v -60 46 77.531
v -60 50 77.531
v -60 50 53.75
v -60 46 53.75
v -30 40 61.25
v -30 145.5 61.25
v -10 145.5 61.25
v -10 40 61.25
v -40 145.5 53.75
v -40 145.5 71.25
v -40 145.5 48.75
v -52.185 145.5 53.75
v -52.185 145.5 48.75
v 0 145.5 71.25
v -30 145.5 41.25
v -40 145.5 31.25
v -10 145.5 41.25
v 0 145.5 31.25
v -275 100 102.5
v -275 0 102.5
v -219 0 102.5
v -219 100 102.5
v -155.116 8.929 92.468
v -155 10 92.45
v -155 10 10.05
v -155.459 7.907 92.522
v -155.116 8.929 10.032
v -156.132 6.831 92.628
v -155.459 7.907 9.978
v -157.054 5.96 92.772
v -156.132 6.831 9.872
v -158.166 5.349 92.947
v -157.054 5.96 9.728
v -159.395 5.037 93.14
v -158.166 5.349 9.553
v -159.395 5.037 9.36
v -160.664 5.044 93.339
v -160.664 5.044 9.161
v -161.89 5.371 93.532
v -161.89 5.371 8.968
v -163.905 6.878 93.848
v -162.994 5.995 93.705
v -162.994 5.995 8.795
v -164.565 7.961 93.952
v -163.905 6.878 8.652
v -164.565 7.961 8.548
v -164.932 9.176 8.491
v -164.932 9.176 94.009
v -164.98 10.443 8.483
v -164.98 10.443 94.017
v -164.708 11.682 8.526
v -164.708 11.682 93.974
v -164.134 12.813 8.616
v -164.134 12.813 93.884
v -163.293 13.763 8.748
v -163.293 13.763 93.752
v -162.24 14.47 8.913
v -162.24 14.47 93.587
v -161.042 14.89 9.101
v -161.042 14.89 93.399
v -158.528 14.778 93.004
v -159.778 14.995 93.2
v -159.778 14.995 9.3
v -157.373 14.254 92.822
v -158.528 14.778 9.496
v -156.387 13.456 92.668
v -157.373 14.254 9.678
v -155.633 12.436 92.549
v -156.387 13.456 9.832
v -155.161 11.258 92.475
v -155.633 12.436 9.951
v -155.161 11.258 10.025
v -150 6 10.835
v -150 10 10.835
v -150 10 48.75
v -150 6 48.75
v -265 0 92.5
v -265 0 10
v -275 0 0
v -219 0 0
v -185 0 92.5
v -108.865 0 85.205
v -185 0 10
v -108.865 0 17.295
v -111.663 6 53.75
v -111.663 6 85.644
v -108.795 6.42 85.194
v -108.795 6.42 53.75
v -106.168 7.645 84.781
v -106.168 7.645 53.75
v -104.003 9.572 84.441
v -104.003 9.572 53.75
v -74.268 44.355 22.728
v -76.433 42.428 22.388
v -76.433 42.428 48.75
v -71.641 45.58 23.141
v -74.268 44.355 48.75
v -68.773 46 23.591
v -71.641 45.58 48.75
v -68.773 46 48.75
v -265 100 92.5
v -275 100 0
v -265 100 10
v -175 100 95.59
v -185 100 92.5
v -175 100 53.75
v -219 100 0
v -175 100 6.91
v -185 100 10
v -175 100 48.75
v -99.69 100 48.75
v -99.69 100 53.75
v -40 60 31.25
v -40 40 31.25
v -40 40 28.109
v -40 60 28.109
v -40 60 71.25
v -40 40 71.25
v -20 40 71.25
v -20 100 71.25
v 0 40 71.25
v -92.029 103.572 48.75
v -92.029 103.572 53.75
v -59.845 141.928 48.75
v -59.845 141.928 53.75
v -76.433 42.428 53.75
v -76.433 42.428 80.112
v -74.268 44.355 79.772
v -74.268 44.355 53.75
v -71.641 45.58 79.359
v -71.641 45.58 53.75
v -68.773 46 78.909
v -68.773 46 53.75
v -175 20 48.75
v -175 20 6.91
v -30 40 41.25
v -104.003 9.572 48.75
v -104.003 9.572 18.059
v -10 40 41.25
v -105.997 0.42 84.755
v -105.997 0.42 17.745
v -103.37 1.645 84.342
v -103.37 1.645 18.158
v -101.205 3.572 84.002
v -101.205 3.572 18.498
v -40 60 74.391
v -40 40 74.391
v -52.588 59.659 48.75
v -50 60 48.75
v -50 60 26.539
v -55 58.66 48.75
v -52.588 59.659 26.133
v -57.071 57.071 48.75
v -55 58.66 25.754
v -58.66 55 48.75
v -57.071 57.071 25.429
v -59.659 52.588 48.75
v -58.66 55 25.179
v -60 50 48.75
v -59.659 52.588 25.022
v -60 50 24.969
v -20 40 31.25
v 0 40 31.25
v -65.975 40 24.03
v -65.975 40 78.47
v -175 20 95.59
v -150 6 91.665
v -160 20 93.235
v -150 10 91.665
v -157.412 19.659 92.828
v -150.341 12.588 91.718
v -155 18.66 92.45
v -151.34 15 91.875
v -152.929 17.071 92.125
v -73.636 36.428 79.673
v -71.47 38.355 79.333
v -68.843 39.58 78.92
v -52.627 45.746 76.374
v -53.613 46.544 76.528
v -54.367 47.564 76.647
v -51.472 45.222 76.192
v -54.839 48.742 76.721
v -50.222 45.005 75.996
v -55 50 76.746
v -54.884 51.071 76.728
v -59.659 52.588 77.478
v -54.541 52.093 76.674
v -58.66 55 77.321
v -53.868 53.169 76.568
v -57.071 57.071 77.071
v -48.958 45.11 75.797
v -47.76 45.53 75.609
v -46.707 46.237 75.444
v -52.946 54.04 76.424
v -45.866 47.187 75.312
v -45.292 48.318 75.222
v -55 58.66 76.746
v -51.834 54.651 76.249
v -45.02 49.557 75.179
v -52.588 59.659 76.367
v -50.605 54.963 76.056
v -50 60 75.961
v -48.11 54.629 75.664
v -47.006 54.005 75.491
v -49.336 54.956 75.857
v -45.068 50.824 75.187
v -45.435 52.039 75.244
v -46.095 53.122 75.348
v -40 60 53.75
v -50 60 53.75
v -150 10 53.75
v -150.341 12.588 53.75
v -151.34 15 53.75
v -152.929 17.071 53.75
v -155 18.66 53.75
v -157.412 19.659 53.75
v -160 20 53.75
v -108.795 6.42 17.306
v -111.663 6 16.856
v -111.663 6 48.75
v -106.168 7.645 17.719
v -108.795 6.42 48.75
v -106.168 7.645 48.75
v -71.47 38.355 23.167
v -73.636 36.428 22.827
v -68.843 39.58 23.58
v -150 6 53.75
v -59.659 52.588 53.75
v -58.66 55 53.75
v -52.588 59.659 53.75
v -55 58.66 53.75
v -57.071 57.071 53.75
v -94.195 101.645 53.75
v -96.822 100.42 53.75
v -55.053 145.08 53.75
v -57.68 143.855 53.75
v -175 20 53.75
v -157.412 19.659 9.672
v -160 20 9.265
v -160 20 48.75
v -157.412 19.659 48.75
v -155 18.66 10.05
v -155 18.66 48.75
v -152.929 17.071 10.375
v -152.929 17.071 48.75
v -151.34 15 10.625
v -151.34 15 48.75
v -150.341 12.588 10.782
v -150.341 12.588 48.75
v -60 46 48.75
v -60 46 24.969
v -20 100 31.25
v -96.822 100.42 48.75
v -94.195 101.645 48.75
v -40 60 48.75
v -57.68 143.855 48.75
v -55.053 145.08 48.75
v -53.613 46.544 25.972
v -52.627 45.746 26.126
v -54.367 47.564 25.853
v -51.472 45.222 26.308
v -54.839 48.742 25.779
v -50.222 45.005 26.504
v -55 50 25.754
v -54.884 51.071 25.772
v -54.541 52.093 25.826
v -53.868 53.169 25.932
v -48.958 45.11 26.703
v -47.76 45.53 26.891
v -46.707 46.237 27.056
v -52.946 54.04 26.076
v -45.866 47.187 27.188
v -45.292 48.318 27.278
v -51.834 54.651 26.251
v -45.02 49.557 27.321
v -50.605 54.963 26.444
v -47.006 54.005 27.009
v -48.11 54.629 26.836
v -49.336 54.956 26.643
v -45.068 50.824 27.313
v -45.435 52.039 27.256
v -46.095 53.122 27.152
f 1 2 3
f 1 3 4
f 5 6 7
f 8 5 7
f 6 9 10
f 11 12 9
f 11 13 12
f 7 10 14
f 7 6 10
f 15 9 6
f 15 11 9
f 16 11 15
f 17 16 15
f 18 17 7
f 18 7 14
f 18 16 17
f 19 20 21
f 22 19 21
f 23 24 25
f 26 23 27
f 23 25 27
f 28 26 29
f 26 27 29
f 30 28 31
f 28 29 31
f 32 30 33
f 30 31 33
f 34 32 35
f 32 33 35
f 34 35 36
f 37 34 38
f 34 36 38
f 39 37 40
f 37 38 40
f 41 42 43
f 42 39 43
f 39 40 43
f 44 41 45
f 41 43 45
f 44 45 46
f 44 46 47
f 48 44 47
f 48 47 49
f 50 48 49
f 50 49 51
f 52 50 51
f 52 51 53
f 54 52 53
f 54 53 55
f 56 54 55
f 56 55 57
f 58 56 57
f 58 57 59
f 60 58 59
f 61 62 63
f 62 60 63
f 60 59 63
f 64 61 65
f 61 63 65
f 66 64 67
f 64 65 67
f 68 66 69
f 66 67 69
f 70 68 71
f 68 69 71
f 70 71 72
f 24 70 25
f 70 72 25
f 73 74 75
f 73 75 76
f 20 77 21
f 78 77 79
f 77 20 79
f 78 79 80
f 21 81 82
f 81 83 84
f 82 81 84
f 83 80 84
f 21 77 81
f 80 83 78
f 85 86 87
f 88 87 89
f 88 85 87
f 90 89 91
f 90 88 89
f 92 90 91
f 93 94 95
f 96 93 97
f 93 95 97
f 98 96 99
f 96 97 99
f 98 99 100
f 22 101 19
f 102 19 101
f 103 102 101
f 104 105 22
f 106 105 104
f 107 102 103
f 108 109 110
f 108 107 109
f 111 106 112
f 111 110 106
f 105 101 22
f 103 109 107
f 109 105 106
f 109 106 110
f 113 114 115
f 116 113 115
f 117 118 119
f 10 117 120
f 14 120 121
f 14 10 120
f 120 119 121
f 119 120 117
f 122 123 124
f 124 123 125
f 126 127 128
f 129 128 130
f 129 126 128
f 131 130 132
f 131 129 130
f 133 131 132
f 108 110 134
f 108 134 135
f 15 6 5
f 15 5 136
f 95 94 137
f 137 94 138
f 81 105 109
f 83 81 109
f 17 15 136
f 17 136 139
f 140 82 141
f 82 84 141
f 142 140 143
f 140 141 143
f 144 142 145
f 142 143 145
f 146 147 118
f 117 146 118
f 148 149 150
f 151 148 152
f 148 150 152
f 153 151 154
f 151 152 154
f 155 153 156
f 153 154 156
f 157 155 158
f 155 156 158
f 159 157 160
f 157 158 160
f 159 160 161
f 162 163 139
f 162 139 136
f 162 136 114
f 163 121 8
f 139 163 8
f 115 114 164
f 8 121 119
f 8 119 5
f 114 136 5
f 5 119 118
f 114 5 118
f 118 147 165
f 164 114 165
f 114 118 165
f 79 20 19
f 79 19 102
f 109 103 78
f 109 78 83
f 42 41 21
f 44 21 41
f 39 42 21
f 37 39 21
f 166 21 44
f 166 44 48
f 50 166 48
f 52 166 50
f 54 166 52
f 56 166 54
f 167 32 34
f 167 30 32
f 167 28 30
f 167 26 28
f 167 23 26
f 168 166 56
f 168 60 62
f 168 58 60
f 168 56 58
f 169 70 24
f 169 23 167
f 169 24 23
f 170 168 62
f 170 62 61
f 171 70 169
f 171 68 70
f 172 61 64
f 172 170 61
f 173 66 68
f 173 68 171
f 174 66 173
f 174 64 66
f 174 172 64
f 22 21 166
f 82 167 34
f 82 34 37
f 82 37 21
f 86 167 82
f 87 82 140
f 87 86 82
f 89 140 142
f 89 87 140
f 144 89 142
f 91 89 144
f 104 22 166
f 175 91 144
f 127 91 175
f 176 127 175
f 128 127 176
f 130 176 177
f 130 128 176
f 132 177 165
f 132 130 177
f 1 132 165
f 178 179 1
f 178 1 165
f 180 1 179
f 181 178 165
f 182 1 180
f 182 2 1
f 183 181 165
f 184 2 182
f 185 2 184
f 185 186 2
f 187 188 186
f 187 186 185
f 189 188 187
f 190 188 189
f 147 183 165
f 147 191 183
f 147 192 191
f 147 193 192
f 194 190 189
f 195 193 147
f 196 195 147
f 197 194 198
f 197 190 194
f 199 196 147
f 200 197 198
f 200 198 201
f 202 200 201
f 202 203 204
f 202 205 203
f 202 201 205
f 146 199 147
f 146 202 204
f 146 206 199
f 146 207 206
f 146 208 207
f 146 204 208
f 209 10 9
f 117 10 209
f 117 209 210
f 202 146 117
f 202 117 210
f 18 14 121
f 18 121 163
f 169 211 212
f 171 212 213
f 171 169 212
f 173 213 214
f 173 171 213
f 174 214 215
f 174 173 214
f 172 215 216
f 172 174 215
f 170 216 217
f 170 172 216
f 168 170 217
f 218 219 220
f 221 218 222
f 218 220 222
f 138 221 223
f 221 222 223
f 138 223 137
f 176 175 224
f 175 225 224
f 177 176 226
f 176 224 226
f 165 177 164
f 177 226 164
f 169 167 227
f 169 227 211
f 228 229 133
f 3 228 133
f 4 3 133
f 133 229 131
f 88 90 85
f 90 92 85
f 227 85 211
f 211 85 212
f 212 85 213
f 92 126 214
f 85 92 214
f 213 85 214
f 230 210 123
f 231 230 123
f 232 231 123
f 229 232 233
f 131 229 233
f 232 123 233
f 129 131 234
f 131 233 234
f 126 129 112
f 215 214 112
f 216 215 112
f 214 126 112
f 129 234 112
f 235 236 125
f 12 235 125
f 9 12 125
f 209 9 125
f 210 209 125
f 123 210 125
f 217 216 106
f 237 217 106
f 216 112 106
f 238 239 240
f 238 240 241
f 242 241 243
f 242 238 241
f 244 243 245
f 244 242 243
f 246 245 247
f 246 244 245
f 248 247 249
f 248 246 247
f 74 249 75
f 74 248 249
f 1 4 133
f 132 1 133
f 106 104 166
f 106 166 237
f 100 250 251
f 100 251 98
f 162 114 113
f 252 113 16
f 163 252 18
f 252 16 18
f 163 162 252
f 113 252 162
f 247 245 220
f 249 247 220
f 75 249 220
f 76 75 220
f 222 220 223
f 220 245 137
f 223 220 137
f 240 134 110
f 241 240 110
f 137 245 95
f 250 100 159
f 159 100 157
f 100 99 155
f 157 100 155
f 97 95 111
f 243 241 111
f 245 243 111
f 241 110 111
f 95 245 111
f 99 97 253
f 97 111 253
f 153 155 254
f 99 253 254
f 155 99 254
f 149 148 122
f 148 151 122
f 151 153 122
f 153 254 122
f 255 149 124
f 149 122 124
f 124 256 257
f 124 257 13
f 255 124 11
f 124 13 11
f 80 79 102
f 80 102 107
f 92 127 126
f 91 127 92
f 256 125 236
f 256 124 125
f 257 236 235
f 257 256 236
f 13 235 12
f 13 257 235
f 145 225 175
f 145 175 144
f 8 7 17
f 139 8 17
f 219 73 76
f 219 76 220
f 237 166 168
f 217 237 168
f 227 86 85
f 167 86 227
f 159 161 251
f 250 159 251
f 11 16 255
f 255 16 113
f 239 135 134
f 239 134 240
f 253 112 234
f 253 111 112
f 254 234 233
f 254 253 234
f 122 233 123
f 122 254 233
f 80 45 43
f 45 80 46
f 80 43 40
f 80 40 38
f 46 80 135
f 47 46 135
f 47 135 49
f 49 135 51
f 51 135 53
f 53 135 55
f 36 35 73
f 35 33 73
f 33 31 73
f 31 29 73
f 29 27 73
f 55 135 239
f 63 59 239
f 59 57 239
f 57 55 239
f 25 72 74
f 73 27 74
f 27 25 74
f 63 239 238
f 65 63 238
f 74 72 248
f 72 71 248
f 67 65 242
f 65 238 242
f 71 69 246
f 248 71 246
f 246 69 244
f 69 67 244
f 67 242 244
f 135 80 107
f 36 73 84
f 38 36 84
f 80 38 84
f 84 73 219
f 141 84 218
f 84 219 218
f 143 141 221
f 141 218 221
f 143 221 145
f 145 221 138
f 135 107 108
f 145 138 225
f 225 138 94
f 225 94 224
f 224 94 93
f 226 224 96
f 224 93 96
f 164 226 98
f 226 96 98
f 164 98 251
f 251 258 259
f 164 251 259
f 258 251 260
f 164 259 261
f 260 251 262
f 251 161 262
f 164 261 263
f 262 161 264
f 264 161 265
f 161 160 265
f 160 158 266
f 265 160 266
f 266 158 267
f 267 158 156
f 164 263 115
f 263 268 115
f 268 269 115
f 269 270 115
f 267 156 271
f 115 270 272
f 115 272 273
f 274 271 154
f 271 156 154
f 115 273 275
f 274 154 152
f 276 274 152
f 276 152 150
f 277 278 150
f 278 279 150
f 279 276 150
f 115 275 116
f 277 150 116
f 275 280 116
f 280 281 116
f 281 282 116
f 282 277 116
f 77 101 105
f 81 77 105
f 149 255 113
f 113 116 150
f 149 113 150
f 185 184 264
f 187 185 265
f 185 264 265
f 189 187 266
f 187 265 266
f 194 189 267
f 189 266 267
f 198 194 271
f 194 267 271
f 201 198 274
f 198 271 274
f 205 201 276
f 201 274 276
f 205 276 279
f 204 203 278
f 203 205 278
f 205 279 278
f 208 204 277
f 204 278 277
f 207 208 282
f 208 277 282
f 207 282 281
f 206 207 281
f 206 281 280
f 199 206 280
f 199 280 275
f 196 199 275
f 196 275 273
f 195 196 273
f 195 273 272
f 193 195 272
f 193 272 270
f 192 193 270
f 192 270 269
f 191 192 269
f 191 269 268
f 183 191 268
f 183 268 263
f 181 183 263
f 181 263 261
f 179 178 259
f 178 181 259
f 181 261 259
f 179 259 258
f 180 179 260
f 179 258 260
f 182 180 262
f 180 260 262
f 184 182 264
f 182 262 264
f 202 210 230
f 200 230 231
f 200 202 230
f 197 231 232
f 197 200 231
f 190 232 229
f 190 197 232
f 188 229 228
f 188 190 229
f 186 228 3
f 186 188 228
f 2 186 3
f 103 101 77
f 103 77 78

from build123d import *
from build123d.topology import SkipClean

# Parameters (mm, degrees)
BOSS_EXTRUDE1_DEPTH = 145.5
CUT_EXTRUDE1_DEPTH  = 45.5
CUT_EXTRUDE2_DEPTH  = 80
SKETCH4_W           = 80
SKETCH4_H           = 82.50000000000003
CUT_EXTRUDE3_DEPTH  = 311.05039912891584
SKETCH5_R           = 4.999999999999991
CUT_EXTRUDE4_DEPTH  = 48.75
CUT_EXTRUDE5_START  = -48.75
SKETCH6_R           = 4.9999999999999885
CUT_EXTRUDE5_DEPTH  = 48.75
SKETCH5_2_R         = 4.999999999999991
CUT_EXTRUDE6_DEPTH  = 328.569076684598
CUT_EXTRUDE7_DEPTH  = 328.569076684598
CUT_EXTRUDE8_DEPTH  = 328.569076684598
CUT_EXTRUDE9_DEPTH  = 48.75
CUT_EXTRUDE10_START = -48.75
SKETCH10_R          = 4.999999999999989
CUT_EXTRUDE10_DEPTH = 48.75
CUT_EXTRUDE11_DEPTH = 328.569076684598
SKETCH12_W          = 20.000000000000007
SKETCH12_H          = 20
CUT_EXTRUDE12_DEPTH = 328.569076684598
SKETCH13_R          = 4.999999999999989
CUT_EXTRUDE13_DEPTH = 316.7282256941878
CUT_EXTRUDE14_DEPTH = 311.05039912891584
FILLET1_R           = 10
FILLET2_R           = 10


with BuildPart() as part:
    # Sketch1 → Boss-Extrude1 (new body)
    with BuildSketch(Plane(origin=(0, 0, 0), x_dir=(1, 0, 0), z_dir=(0, 1, 0))):
        Polygon((0, 0), (-275, 0), (-275, -102.50000000000007), (0, -102.5), align=None)
    extrude(amount=BOSS_EXTRUDE1_DEPTH)

    # Sketch2 → Cut-Extrude1 (cut)
    with BuildSketch(Plane(origin=(0, 145.5, 0), x_dir=(1, 0, 0), z_dir=(0, 1, 0))):
        Polygon((-275, 0), (-107.00000000000001, 0), (-107.00000000000001, -102.50000000000007), (-275, -102.50000000000003), align=None)
    extrude(amount=-CUT_EXTRUDE1_DEPTH, mode=Mode.SUBTRACT)

    # Sketch3 → Cut-Extrude2 (cut)
    with BuildSketch(Plane(origin=(0, 99.99999999999999, 0), x_dir=(1, 0, 0), z_dir=(0, 1, 0))):
        Polygon((-107.00000000000001, 5.551e-14), (-175.00000000000003, 0), (-175.00000000000003, -48.75), (-107.00000000000001, -48.75000000000001), align=None)
        Polygon((-107.00000000000001, -102.50000000000007), (-175.00000000000003, -102.50000000000003), (-175.00000000000003, -53.75000000000002), (-107.00000000000001, -53.750000000000014), align=None)
    extrude(amount=-CUT_EXTRUDE2_DEPTH, mode=Mode.SUBTRACT)

    # Sketch4 → Cut-Extrude3 (cut, through all)
    with BuildSketch(Plane(origin=(0, 99.99999999999999, 0), x_dir=(1, 0, 0), z_dir=(0, 1, 0))):
        with Locations((-225, -51.250000000000014)):
            Rectangle(SKETCH4_W, SKETCH4_H)
    extrude(amount=-CUT_EXTRUDE3_DEPTH, mode=Mode.SUBTRACT)

    # Sketch5 → Cut-Extrude4 (cut)
    with BuildSketch(Plane.XY.offset(102.5)):
        with Locations((-160.00000000000009, 10)):
            Circle(SKETCH5_R)
        with BuildLine():
            Line((-107.00000000000007, 6.000000000000005), (-150.0000000000001, 5.999999999999997))
            Line((-150.0000000000001, 5.999999999999997), (-150.0000000000001, 10.000000000000018))
            ThreePointArc((-150.0000000000001, 10.000000000000018), (-152.92893218813464, 17.071067811865472), (-160.00000000000009, 19.99999999999999))
            Line((-160.00000000000009, 19.99999999999999), (-175.00000000000006, 19.99999999999999))
            Line((-175.00000000000006, 19.99999999999999), (-175.00000000000006, 99.99999999999999))
            Line((-175.00000000000006, 99.99999999999999), (-107.00000000000004, 99.99999999999999))
            Line((-107.00000000000004, 99.99999999999999), (-107.00000000000007, 6.000000000000005))
        make_face()
    extrude(amount=-CUT_EXTRUDE4_DEPTH, mode=Mode.SUBTRACT)

    # Sketch6 → Cut-Extrude5 (cut)
    with BuildSketch(Plane(origin=(0, 0, 0), x_dir=(-1, 0, 0), z_dir=(0, 0, -1)).offset(CUT_EXTRUDE5_START)):
        with Locations((160.00000000000006, 10.00000000000002)):
            Circle(SKETCH6_R)
        with BuildLine():
            Line((107.00000000000001, 99.99999999999999), (175.00000000000006, 99.99999999999999))
            Line((175.00000000000006, 99.99999999999999), (175.00000000000003, 19.99999999999999))
            Line((175.00000000000003, 19.99999999999999), (160.00000000000006, 19.99999999999999))
            ThreePointArc((160.00000000000006, 19.99999999999999), (152.9289321881346, 17.071067811865476), (150.00000000000009, 10.000000000000018))
            Line((150.00000000000009, 10.000000000000018), (150.00000000000009, 5.999999999999997))
            Line((150.00000000000009, 5.999999999999997), (107.00000000000004, 6.000000000000005))
            Line((107.00000000000004, 6.000000000000005), (107.00000000000001, 99.99999999999999))
        make_face()
    extrude(amount=CUT_EXTRUDE5_DEPTH, mode=Mode.SUBTRACT)

    # Sketch5<2> → Cut-Extrude6 (cut, through all)
    with SkipClean():  # the faces are left unmerged after this step: merging them gives an invalid solid
        with BuildSketch(Plane.XY.offset(102.5)):
            with Locations((-160.00000000000009, 10)):
                Circle(SKETCH5_2_R)
        extrude(amount=-CUT_EXTRUDE6_DEPTH, mode=Mode.SUBTRACT)

    # Sketch7 → Cut-Extrude7 (cut, through all)
    with SkipClean():  # the faces are left unmerged after this step: merging them gives an invalid solid
        with BuildSketch(Plane.XY.offset(102.5)):
            Polygon((-2.842e-14, 40), (-70.63816880397907, 40), (-104.20215405107005, 0), (-3.104e-14, 0), align=None)
        extrude(amount=-CUT_EXTRUDE7_DEPTH, mode=Mode.SUBTRACT)

    # Sketch8 → Cut-Extrude8 (cut, through all)
    with SkipClean():  # the faces are left unmerged after this step: merging them gives an invalid solid
        with BuildSketch(Plane.XY.offset(102.5)):
            Polygon((-107.00000000000004, 145.5), (-107.00000000000004, 99.99999999999999), (-95.02675824761518, 99.99999999999997), (-56.847725029049194, 145.5), align=None)
        extrude(amount=-CUT_EXTRUDE8_DEPTH, mode=Mode.SUBTRACT)

    # Sketch9 → Cut-Extrude9 (cut)
    with SkipClean():  # the faces are left unmerged after this step: merging them gives an invalid solid
        with BuildSketch(Plane.XY.offset(102.5)):
            with BuildLine():
                Line((-40.000000000000036, 145.5), (-40.00000000000002, 60))
                Line((-40.00000000000002, 60), (-50.00000000000003, 60))
                ThreePointArc((-50.00000000000003, 60), (-57.07106781186553, 57.071067811865454), (-60.000000000000036, 49.99999999999993))
                Line((-60.000000000000036, 49.99999999999993), (-60.000000000000036, 46))
                Line((-60.000000000000036, 46), (-73.43601475290903, 46))
                Line((-73.43601475290903, 46), (-107.00000000000007, 6.000000000000005))
                Line((-107.00000000000007, 6.000000000000005), (-107.00000000000004, 99.99999999999999))
                Line((-107.00000000000004, 99.99999999999999), (-95.02675824761518, 99.99999999999997))
                Line((-95.02675824761518, 99.99999999999997), (-56.847725029049194, 145.5))
                Line((-56.847725029049194, 145.5), (-40.000000000000036, 145.5))
            make_face()
        extrude(amount=-CUT_EXTRUDE9_DEPTH, mode=Mode.SUBTRACT)

    # Sketch10 → Cut-Extrude10 (cut)
    with SkipClean():  # the faces are left unmerged after this step: merging them gives an invalid solid
        with BuildSketch(Plane(origin=(0, 0, 0), x_dir=(-1, 0, 0), z_dir=(0, 0, -1)).offset(CUT_EXTRUDE10_START)):
            with Locations((50, 49.999999999999986)):
                Circle(SKETCH10_R)
            with BuildLine():
                Line((40.00000000000001, 145.5), (39.99999999999999, 60))
                Line((39.99999999999999, 60), (50, 60))
                ThreePointArc((50, 60), (57.071067811865504, 57.07106781186545), (60.00000000000001, 49.99999999999993))
                Line((60.00000000000001, 49.99999999999993), (60.00000000000001, 46))
                Line((60.00000000000001, 46), (73.436014752909, 46))
                Line((73.436014752909, 46), (107.00000000000004, 6.000000000000005))
                Line((107.00000000000004, 6.000000000000005), (107.00000000000001, 99.99999999999999))
                Line((107.00000000000001, 99.99999999999999), (95.02675824761515, 99.99999999999997))
                Line((95.02675824761515, 99.99999999999997), (56.847725029049165, 145.5))
                Line((56.847725029049165, 145.5), (40.00000000000001, 145.5))
            make_face()
        extrude(amount=CUT_EXTRUDE10_DEPTH, mode=Mode.SUBTRACT)

    # Sketch11 → Cut-Extrude11 (cut, through all)
    with SkipClean():  # the faces are left unmerged after this step: merging them gives an invalid solid
        with BuildSketch(Plane(origin=(0, 145.5, 0), x_dir=(1, 0, 0), z_dir=(0, 1, 0))):
            Polygon((-40.00000000000001, -71.25), (0, -71.25), (0, -102.5), (-39.99999999999999, -102.5), align=None)
            Polygon((-40.00000000000001, -31.249999999999993), (3.47e-15, -31.25), (0, 0), (-40.00000000000001, 0), align=None)
        extrude(amount=-CUT_EXTRUDE11_DEPTH, mode=Mode.SUBTRACT)

    # Sketch12 → Cut-Extrude12 (cut, through all)
    with SkipClean():  # the faces are left unmerged after this step: merging them gives an invalid solid
        with BuildSketch(Plane(origin=(0, 145.5, 0), x_dir=(1, 0, 0), z_dir=(0, 1, 0))):
            with Locations((-20, -51.24999999999999)):
                Rectangle(SKETCH12_W, SKETCH12_H)
        extrude(amount=-CUT_EXTRUDE12_DEPTH, mode=Mode.SUBTRACT)

    # Sketch13 → Cut-Extrude13 (cut, through all)
    with BuildSketch(Plane(origin=(0, 0, 48.75), x_dir=(-1, 0, 0), z_dir=(0, 0, -1))):
        with Locations((50, 49.999999999999986)):
            Circle(SKETCH13_R)
    extrude(amount=-CUT_EXTRUDE13_DEPTH, mode=Mode.SUBTRACT)

    # Sketch14 → Cut-Extrude14 (cut, through all)
    with SkipClean():  # the faces are left unmerged after this step: merging them gives an invalid solid
        with BuildSketch(Plane(origin=(0, 99.99999999999999, 0), x_dir=(1, 0, 0), z_dir=(0, 1, 0))):
            Polygon((-219.00000000000003, -8.08e-15), (-20.000000000000004, -31.249999999999996), (-20.000000000000004, 0), align=None)
            Polygon((-219.00000000000003, -102.50000000000003), (-20.000000000000004, -71.25), (-20.000000000000004, -102.50000000000003), align=None)
        extrude(amount=-CUT_EXTRUDE14_DEPTH, mode=Mode.SUBTRACT)

    # Fillet1
    fillet1_edges = [part.edges().sort_by_distance(p)[0] for p in [
        (-56.847725029049165, 145.5, 51.25),
        (-95.02675824761515, 99.99999999999997, 51.25),
        (-107.00000000000004, 6.000000000000005, 33.168969849246224),
        (-73.436014752909, 46, 35.80433301249144),
        (-107.00000000000004, 6.000000000000005, 69.33103015075378),
        (-73.436014752909, 46, 66.69566698750856),
    ]]
    fillet(fillet1_edges, radius=FILLET1_R)

    # Fillet2
    fillet2_edges = [part.edges().sort_by_distance(p)[0] for p in [
        (-70.63816880397904, 40, 51.25),
        (-104.20215405107002, -2e-17, 51.25000000000001),
    ]]
    fillet(fillet2_edges, radius=FILLET2_R)


solid = part.part
